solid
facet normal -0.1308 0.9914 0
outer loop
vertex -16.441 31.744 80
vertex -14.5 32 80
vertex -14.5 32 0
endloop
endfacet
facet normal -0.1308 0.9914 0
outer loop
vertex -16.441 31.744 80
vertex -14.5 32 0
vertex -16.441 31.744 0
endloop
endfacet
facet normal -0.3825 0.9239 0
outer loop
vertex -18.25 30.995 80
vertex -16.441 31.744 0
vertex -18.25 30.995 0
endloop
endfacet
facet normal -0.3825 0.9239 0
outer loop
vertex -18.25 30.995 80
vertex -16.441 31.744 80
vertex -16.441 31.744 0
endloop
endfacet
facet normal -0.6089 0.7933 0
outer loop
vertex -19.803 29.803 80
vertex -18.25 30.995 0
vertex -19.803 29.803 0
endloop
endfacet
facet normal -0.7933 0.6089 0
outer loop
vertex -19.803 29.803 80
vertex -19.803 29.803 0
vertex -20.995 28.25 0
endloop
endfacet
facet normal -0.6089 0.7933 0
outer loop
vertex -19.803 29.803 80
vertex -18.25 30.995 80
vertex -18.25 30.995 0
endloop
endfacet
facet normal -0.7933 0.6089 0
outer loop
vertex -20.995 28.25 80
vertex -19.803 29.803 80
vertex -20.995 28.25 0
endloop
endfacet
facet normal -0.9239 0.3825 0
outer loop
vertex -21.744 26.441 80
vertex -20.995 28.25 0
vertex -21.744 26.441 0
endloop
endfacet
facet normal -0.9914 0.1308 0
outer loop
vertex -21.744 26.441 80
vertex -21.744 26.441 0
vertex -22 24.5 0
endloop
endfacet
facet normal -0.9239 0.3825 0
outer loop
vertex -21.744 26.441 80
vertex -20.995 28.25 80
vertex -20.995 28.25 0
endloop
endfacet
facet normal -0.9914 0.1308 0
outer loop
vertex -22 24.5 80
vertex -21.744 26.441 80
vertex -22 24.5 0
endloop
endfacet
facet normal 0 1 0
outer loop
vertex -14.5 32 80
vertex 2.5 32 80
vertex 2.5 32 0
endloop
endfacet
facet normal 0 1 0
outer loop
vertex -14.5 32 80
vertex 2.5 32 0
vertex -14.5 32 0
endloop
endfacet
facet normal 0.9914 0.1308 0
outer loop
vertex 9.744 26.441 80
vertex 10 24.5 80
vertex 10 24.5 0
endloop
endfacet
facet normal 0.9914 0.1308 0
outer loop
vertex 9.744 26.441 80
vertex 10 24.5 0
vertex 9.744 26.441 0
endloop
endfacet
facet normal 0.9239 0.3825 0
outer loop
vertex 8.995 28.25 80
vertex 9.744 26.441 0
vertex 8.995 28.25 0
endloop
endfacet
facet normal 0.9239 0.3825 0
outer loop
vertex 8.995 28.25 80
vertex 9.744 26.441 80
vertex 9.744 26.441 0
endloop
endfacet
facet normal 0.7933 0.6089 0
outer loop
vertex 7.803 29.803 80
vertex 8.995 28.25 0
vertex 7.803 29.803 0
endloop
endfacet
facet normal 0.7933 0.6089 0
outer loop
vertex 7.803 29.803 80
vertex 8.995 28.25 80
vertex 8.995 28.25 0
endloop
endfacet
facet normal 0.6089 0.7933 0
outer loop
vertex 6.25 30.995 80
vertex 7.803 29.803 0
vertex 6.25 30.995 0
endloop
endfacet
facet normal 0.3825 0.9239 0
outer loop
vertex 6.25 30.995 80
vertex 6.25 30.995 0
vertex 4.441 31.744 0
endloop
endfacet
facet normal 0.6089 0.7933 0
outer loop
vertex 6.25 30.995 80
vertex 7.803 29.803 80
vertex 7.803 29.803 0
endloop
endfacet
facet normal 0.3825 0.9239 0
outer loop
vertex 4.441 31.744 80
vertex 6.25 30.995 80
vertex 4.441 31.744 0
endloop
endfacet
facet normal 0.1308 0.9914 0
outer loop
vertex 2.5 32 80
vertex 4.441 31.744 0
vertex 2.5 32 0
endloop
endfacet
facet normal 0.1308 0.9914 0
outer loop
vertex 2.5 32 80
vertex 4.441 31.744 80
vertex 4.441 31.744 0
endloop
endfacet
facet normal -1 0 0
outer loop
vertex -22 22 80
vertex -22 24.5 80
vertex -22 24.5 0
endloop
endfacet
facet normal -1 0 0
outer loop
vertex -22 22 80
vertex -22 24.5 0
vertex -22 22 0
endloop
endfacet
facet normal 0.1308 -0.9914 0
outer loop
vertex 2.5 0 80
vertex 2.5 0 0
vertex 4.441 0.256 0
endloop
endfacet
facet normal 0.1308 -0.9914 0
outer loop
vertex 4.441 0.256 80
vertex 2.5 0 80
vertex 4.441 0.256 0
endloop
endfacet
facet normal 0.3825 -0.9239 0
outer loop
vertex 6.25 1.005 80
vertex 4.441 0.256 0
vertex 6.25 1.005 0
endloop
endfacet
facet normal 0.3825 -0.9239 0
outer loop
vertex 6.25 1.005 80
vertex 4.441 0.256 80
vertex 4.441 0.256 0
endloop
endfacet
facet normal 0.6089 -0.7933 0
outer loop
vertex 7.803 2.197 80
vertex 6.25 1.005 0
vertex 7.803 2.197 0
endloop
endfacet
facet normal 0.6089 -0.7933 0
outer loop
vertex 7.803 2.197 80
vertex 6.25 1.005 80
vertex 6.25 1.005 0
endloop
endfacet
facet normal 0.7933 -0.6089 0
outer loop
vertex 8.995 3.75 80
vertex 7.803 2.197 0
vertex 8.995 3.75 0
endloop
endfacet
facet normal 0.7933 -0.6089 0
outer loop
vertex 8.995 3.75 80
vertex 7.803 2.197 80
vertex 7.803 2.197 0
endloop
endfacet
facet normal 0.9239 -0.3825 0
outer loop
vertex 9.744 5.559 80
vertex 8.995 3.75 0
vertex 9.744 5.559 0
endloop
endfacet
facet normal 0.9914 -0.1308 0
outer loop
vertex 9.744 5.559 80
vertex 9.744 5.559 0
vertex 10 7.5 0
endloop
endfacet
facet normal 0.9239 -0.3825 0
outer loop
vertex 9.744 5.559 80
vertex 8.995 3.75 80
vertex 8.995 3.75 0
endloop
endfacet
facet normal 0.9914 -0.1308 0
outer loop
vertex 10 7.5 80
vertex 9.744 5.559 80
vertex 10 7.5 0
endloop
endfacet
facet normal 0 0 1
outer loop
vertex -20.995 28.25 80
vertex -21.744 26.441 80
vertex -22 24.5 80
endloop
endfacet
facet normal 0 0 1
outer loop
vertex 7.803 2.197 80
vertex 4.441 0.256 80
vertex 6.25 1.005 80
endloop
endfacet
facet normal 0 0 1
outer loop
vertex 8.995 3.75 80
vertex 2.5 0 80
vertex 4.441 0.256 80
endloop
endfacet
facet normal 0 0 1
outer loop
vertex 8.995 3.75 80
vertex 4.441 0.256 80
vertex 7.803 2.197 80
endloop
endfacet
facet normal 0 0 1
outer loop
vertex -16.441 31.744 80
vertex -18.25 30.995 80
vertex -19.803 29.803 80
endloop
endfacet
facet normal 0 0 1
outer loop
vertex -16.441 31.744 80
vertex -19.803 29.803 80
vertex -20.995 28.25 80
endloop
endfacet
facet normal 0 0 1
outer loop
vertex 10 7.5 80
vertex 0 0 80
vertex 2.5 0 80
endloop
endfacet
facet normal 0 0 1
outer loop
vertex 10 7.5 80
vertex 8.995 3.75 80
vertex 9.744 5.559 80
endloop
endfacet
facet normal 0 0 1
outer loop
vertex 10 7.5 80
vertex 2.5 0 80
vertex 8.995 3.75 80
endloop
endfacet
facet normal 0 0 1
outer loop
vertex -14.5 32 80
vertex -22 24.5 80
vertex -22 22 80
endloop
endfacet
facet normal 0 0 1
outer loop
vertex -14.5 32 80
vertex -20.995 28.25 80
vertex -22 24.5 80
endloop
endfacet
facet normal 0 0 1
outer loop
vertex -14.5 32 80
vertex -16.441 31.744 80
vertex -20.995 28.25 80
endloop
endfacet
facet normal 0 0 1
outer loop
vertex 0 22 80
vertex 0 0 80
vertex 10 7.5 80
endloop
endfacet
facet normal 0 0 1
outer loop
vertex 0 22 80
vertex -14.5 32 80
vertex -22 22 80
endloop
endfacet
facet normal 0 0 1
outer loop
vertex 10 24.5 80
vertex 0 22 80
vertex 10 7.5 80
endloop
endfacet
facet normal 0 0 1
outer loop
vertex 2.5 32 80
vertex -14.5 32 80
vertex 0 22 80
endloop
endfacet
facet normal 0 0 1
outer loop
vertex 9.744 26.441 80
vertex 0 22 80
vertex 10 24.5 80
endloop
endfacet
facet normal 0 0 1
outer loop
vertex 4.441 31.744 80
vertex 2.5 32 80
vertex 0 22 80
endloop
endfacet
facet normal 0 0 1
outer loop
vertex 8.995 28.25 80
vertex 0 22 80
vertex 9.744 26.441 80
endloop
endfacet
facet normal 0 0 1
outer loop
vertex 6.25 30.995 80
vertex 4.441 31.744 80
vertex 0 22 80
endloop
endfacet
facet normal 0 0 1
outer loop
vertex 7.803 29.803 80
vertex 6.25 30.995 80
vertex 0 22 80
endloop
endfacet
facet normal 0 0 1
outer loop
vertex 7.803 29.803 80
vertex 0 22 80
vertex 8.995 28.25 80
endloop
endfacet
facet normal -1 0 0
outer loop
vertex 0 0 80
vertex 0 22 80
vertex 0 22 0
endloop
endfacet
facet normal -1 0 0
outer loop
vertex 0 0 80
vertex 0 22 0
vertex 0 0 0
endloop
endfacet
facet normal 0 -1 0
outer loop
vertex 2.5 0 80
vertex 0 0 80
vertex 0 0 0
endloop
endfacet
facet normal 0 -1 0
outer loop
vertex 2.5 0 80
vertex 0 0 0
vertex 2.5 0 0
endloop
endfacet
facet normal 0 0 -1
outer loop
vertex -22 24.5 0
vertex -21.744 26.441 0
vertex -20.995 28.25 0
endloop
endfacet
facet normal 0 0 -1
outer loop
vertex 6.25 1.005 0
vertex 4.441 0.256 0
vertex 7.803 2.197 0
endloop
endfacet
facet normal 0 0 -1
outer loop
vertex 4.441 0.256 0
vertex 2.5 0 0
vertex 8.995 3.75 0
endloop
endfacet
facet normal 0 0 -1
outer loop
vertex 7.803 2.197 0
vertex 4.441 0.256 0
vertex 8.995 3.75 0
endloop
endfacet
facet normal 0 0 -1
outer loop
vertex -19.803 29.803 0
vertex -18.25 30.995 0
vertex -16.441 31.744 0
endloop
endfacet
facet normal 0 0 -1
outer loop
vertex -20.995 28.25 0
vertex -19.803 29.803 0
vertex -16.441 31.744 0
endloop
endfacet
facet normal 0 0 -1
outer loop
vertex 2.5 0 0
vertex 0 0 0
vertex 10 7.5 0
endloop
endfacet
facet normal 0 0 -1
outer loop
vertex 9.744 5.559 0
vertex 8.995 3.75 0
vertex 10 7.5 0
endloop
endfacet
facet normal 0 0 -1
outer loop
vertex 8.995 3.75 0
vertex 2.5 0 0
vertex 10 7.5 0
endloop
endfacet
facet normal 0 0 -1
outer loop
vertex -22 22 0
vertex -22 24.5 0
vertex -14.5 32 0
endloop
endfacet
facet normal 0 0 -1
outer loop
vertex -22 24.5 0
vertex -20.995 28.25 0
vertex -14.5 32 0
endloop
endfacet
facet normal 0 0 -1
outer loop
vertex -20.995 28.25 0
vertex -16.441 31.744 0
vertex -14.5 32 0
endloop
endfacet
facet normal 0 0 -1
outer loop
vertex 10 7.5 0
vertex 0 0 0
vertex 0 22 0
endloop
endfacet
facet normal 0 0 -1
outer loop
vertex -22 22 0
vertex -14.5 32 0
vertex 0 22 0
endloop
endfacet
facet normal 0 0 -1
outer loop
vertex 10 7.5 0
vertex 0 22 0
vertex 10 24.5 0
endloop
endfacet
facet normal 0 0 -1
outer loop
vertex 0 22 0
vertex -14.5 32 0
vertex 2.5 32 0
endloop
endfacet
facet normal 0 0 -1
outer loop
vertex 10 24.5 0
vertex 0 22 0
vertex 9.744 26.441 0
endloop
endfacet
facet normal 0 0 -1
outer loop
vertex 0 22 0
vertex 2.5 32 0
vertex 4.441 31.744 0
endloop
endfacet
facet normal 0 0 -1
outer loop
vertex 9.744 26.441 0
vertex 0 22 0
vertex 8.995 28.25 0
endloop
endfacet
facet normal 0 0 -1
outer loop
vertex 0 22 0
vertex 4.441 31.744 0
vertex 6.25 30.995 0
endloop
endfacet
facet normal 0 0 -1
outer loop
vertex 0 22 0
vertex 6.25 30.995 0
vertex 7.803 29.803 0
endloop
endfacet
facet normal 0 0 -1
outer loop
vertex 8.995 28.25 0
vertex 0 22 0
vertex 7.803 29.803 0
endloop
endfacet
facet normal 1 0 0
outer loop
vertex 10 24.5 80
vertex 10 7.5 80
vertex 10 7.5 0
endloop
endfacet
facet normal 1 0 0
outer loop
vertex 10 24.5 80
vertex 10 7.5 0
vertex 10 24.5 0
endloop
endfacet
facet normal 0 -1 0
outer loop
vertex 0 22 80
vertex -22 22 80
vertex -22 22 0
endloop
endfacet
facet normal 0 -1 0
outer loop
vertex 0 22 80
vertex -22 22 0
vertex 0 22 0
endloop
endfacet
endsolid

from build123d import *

# Parameters (mm, degrees)
BOSS_EXTRUDE1_DEPTH = 80


with BuildPart() as part:
    # Sketch1 → Boss-Extrude1 (new body)
    with BuildSketch(Plane.XY.offset(80)):
        with BuildLine():
            Line((-22, 24.5), (-22, 22))
            Line((-22, 22), (0, 22))
            Line((0, 22), (0, 0))
            Line((0, 0), (2.5, 0))
            ThreePointArc((2.5, 0), (7.803300859, 2.196699141), (10, 7.5))
            Line((10, 7.5), (10, 24.5))
            ThreePointArc((10, 24.5), (7.803300859, 29.803300859), (2.5, 32))
            Line((2.5, 32), (-14.5, 32))
            ThreePointArc((-14.5, 32), (-19.803300859, 29.803300859), (-22, 24.5))
        make_face()
    extrude(amount=-BOSS_EXTRUDE1_DEPTH)


solid = part.part
